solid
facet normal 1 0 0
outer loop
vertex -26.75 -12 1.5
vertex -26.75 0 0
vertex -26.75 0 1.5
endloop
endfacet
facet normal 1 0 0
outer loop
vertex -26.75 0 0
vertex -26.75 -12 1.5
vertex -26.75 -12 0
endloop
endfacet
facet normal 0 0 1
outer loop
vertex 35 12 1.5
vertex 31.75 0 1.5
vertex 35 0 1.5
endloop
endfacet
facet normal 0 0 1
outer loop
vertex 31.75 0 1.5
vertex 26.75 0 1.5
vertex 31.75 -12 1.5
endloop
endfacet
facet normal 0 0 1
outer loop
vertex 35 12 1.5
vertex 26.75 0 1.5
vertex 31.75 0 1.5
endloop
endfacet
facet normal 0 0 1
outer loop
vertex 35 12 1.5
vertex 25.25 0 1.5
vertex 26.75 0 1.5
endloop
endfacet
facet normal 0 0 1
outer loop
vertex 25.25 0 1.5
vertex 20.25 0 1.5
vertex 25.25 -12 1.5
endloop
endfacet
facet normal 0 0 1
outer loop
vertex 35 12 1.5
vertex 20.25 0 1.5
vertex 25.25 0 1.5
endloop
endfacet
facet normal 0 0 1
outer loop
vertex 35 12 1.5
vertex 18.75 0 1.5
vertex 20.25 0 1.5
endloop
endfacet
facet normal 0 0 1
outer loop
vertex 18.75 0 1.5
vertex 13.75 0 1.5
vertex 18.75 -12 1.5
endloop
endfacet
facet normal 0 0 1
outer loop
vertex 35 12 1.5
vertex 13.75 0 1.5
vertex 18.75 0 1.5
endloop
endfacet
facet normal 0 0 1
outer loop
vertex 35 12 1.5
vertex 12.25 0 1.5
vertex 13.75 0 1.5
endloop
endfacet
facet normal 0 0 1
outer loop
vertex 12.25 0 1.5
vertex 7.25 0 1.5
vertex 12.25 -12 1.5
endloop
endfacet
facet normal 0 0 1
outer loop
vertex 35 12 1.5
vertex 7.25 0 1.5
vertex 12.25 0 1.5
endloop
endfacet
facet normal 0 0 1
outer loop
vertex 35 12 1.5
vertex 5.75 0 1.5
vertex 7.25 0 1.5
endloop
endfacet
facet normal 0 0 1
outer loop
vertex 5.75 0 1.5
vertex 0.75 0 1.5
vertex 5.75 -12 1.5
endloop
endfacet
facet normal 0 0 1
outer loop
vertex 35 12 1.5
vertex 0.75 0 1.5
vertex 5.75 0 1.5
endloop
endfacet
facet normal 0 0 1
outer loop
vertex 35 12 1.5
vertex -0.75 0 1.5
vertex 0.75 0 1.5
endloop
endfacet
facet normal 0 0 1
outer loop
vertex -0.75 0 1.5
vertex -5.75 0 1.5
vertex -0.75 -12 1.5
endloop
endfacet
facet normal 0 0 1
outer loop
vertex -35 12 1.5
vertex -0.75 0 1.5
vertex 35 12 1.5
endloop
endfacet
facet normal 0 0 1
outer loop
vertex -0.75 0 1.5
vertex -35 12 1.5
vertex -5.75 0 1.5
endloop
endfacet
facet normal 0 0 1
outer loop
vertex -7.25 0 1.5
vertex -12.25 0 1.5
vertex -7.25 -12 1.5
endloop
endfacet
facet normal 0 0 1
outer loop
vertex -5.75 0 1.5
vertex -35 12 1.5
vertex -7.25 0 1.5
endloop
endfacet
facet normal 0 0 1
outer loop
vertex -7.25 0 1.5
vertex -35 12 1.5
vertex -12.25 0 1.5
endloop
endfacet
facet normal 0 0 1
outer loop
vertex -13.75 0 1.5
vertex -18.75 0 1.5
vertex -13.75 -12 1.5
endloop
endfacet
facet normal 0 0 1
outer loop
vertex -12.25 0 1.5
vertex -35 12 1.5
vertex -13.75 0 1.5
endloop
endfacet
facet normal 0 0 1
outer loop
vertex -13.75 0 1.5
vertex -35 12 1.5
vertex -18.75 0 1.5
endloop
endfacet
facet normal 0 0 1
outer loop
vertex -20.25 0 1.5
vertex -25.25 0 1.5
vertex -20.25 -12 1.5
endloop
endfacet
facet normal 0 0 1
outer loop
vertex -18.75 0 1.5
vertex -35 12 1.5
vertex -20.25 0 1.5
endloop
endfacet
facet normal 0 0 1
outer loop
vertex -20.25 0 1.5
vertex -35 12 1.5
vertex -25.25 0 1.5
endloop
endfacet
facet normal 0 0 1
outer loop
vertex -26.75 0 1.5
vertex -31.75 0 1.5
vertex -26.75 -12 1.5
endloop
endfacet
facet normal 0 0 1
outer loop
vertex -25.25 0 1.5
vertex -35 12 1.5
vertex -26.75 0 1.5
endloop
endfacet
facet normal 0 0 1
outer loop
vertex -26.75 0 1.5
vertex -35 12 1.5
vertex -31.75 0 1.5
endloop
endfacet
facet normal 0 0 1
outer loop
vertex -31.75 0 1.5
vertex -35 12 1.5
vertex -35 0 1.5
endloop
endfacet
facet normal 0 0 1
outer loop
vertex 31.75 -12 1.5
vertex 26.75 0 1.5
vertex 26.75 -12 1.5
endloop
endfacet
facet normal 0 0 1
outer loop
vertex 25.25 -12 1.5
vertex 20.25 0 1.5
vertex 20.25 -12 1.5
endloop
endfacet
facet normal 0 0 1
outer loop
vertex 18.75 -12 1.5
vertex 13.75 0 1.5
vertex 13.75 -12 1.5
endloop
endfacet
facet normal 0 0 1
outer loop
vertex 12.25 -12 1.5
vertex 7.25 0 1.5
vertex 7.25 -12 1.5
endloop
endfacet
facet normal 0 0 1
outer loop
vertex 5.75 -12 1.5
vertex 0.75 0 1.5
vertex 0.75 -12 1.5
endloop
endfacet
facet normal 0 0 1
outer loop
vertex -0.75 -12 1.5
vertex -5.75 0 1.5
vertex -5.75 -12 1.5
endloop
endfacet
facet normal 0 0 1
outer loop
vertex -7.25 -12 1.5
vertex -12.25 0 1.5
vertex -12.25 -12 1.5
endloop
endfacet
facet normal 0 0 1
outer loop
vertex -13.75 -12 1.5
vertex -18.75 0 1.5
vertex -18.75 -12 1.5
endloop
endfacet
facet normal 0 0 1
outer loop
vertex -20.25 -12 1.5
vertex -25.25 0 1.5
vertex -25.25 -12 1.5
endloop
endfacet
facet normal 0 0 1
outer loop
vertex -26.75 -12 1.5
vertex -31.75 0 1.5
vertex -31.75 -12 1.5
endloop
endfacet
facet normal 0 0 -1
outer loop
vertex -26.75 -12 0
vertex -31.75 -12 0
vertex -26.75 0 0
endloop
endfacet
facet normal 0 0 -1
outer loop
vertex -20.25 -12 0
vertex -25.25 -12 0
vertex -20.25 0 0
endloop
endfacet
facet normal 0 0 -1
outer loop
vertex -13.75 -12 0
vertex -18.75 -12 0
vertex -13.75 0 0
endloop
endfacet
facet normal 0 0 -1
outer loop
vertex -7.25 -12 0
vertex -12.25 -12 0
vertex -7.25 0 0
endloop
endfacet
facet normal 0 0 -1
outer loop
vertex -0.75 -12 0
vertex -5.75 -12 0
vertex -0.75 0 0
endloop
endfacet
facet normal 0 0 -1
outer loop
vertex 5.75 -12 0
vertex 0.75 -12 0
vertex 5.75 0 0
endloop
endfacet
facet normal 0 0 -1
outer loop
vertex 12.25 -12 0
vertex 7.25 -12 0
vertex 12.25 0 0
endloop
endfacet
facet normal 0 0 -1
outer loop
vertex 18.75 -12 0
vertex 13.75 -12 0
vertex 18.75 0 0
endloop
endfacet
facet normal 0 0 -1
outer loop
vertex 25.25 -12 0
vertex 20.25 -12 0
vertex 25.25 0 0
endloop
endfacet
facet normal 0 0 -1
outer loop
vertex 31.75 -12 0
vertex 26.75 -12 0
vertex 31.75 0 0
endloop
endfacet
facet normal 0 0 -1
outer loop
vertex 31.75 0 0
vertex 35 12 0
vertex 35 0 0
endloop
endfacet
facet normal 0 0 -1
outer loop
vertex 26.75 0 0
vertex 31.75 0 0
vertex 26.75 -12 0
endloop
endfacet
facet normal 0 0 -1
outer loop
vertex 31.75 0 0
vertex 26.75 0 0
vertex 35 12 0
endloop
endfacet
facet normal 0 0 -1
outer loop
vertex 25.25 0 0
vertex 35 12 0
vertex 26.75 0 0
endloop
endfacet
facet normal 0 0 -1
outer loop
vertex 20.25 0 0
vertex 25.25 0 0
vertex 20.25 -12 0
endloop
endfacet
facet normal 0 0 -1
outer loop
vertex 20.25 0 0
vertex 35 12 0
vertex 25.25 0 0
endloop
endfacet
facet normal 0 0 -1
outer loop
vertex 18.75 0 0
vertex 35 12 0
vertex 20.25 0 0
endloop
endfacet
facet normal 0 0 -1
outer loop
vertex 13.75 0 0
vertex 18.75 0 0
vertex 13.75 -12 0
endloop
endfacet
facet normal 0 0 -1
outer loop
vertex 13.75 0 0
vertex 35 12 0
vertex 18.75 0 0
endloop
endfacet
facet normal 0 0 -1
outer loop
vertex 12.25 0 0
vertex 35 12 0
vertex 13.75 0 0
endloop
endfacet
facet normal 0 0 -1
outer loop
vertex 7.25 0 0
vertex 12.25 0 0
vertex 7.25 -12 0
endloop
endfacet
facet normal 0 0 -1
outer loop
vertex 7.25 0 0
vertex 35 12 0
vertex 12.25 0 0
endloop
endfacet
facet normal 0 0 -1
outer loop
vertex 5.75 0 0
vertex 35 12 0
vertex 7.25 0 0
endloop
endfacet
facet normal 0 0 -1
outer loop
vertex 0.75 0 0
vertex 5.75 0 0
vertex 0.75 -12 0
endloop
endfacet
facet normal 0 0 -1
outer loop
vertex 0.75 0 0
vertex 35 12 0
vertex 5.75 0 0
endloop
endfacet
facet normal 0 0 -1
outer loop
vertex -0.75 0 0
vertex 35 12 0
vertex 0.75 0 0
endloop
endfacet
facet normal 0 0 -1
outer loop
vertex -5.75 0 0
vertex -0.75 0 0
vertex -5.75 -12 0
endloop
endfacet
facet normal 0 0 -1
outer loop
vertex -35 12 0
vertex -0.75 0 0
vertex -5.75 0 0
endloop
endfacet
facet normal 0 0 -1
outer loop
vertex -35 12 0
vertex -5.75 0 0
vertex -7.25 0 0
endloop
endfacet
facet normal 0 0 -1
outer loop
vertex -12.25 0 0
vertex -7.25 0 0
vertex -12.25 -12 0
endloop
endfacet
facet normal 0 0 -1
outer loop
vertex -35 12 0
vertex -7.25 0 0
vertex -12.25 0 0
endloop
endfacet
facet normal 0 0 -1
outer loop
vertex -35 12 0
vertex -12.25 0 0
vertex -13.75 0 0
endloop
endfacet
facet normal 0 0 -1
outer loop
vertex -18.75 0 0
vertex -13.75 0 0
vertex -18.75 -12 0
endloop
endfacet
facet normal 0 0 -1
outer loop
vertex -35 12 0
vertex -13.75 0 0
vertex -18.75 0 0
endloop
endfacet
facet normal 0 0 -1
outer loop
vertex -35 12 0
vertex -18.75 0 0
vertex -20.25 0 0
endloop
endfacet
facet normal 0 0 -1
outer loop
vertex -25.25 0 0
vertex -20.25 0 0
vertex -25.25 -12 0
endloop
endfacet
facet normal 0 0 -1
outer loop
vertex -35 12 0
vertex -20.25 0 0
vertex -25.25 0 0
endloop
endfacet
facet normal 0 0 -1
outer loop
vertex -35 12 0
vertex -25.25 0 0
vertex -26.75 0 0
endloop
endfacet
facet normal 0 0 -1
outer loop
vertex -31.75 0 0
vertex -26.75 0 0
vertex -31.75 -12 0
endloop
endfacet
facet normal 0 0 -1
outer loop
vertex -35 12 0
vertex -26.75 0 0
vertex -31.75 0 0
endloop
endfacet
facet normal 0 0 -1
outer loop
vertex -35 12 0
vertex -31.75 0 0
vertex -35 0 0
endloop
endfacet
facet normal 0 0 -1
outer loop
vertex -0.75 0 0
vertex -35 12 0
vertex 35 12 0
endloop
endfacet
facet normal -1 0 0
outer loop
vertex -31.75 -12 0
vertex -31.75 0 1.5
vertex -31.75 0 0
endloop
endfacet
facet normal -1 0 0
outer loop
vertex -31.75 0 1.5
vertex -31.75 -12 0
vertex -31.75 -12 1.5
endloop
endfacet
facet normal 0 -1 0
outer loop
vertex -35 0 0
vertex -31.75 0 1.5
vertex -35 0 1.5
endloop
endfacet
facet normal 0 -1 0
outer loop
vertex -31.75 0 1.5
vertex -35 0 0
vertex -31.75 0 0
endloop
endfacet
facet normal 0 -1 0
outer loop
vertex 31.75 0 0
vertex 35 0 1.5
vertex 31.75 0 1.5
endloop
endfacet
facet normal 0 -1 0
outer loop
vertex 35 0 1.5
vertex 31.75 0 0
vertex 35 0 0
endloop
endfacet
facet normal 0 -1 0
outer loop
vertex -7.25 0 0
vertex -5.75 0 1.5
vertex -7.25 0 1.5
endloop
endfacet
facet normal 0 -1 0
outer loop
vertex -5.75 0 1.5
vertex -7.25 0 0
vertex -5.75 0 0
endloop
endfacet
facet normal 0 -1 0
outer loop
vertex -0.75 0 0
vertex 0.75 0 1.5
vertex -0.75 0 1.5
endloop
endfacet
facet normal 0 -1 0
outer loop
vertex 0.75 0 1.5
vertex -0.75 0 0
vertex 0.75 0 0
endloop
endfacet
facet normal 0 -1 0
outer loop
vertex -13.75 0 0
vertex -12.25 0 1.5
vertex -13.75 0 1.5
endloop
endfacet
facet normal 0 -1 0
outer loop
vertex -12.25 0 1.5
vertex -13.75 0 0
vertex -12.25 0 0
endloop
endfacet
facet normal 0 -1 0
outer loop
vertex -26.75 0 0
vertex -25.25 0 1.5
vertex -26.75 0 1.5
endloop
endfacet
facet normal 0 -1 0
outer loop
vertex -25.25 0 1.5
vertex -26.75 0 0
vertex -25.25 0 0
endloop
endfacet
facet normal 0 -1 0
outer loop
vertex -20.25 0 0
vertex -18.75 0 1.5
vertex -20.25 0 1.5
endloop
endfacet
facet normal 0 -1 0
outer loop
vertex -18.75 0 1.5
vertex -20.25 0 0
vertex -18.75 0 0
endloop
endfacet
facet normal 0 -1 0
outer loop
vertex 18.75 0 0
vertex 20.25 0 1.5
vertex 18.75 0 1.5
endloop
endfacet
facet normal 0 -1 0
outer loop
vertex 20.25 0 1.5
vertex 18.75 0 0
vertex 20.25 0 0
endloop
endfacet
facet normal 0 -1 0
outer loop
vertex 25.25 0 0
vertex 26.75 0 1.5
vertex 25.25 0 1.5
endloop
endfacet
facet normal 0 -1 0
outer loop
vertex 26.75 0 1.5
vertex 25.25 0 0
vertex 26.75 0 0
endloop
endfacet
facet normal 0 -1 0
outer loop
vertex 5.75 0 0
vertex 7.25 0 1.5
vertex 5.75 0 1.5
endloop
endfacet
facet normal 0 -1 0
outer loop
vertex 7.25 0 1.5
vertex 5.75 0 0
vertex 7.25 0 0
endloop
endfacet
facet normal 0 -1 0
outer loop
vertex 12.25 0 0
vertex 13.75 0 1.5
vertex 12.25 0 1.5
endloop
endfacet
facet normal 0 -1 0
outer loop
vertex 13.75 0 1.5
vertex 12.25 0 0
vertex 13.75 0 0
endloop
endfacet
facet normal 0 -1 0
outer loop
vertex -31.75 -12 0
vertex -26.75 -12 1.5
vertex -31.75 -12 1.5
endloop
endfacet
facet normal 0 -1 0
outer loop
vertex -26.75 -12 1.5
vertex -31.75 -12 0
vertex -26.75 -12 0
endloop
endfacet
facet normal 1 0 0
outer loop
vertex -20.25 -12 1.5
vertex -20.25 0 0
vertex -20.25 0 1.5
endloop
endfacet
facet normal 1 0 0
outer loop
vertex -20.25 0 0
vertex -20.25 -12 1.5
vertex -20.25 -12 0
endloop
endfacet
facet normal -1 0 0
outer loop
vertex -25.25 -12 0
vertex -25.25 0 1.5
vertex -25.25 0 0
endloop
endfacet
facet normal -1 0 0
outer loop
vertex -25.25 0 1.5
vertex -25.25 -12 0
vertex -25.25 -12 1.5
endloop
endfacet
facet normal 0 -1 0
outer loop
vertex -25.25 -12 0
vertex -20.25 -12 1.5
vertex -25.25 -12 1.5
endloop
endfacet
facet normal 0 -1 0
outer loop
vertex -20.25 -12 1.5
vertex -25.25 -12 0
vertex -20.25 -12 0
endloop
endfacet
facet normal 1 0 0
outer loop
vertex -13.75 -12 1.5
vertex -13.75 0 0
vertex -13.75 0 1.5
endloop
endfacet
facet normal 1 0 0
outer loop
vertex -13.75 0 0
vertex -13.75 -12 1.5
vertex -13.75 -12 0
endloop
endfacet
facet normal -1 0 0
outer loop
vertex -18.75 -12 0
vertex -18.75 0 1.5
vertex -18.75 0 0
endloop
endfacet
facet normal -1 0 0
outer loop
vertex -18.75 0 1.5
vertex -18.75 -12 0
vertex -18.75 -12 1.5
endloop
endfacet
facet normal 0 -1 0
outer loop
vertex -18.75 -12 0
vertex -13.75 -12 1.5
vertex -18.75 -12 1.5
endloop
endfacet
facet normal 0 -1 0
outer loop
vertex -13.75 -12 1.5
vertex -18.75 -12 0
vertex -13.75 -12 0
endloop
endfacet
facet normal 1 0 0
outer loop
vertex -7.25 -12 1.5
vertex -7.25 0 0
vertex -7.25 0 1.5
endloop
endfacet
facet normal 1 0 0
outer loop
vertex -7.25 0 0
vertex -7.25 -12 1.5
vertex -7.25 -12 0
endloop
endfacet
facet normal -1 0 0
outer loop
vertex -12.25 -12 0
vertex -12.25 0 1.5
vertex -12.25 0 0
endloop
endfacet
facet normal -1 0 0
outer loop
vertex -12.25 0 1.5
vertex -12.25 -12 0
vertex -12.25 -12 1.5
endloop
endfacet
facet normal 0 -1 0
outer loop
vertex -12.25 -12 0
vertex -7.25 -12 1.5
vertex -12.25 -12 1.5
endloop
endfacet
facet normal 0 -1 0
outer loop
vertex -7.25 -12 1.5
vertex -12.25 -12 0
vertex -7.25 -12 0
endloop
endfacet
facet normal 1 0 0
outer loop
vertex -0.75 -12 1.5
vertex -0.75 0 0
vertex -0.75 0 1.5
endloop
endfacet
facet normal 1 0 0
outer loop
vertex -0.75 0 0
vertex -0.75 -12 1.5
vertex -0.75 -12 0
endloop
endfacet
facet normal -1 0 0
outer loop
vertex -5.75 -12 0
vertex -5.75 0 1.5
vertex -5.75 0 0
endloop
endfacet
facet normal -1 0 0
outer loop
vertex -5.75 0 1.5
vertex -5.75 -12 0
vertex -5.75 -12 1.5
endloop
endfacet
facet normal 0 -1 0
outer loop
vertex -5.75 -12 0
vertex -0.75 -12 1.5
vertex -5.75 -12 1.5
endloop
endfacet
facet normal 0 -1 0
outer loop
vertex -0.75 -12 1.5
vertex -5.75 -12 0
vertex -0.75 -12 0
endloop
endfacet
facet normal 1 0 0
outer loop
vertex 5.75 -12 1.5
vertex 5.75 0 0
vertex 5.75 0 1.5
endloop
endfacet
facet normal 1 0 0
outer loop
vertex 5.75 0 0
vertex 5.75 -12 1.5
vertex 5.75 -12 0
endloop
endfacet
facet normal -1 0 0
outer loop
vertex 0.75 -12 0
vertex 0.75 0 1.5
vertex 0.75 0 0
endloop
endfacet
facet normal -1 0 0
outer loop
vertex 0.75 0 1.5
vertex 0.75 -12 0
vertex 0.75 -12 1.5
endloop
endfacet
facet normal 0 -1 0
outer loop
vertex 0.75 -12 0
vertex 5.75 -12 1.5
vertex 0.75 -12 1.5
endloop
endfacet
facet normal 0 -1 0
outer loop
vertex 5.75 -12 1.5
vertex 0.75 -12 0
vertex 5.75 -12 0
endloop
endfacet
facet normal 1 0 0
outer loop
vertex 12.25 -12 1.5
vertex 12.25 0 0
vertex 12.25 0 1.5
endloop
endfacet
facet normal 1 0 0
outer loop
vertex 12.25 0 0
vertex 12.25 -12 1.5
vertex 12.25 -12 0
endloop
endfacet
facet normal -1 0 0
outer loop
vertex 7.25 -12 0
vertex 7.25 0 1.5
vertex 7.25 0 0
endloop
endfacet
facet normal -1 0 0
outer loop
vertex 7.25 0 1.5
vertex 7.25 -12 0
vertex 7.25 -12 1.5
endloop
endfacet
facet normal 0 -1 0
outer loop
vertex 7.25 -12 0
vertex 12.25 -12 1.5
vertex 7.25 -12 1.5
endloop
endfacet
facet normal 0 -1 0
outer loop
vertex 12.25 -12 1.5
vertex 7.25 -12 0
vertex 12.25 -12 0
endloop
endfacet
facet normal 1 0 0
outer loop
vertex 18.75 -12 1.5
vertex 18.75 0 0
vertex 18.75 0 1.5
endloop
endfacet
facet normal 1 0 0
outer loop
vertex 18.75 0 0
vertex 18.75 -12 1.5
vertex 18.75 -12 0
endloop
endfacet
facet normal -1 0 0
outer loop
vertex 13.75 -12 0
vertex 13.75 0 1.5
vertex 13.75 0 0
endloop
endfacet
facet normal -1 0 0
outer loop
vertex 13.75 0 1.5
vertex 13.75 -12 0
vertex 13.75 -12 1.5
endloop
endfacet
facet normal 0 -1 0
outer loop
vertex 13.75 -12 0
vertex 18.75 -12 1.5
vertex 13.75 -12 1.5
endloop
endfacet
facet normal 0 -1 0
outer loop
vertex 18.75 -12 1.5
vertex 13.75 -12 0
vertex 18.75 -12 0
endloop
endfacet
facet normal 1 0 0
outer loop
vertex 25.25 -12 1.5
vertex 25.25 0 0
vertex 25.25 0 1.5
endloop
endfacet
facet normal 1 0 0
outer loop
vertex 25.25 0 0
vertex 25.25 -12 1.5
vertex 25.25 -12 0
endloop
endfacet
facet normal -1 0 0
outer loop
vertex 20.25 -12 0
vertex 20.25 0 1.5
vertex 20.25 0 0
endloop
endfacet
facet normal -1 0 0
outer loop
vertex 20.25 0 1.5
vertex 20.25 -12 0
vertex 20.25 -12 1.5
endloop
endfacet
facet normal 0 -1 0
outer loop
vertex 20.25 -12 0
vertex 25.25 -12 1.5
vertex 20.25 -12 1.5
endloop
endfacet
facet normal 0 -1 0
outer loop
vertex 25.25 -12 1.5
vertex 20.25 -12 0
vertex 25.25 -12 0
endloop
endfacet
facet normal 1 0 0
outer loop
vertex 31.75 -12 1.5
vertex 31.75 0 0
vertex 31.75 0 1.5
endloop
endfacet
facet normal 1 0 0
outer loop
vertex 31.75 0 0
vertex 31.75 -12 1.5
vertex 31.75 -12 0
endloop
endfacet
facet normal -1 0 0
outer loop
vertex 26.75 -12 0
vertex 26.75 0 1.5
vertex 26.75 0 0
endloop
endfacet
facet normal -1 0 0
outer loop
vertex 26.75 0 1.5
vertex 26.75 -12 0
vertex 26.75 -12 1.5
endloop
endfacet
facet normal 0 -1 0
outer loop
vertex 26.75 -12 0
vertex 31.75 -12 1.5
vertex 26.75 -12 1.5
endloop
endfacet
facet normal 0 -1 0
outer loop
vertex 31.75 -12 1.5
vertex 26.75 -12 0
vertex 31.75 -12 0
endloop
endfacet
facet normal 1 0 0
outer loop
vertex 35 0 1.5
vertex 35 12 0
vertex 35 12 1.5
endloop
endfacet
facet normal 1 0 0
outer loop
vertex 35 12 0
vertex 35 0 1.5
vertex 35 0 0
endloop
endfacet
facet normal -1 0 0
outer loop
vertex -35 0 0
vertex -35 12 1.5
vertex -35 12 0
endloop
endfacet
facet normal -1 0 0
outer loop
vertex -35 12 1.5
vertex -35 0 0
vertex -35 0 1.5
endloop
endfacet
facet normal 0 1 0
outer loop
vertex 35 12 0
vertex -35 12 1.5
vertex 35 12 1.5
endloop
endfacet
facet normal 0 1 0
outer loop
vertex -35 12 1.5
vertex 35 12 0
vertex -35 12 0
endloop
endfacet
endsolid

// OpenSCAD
// 10-well comb for casting agarose gels, printed lying flat
// Units: mm

// ---- Parameters ----
plate_thickness   = 1.5;   // Z thickness of the whole comb
spine_length      = 70;    // X length of the back bar (spine)
spine_width       = 12;    // Y width of the back bar
teeth_count       = 10;    // number of wells/teeth
teeth_width       = 5.0;   // tooth width along X
teeth_length      = 12;    // tooth length along Y (overlaps spine width)
teeth_gap         = 1.5;   // clear gap between neighbouring teeth
cut_extra         = 0.5;   // overshoot for clean boolean cuts

$fn = 64;

// ---- Derived ----
pitch   = teeth_width + teeth_gap;            // centre-to-centre spacing
x_start = -(teeth_count - 1) * pitch / 2;    // first tooth centre X (row centred)

// ---- Model ----
union() {
    // Back bar (spine)
    translate([-spine_length / 2, 0, 0])
        cube([spine_length, spine_width, plate_thickness]);

    // Teeth hanging in -Y
    for (i = [0 : teeth_count - 1]) {
        translate([x_start + i * pitch - teeth_width / 2,
                   -teeth_length,
                   0])
            cube([teeth_width, teeth_length, plate_thickness]);
    }
}
